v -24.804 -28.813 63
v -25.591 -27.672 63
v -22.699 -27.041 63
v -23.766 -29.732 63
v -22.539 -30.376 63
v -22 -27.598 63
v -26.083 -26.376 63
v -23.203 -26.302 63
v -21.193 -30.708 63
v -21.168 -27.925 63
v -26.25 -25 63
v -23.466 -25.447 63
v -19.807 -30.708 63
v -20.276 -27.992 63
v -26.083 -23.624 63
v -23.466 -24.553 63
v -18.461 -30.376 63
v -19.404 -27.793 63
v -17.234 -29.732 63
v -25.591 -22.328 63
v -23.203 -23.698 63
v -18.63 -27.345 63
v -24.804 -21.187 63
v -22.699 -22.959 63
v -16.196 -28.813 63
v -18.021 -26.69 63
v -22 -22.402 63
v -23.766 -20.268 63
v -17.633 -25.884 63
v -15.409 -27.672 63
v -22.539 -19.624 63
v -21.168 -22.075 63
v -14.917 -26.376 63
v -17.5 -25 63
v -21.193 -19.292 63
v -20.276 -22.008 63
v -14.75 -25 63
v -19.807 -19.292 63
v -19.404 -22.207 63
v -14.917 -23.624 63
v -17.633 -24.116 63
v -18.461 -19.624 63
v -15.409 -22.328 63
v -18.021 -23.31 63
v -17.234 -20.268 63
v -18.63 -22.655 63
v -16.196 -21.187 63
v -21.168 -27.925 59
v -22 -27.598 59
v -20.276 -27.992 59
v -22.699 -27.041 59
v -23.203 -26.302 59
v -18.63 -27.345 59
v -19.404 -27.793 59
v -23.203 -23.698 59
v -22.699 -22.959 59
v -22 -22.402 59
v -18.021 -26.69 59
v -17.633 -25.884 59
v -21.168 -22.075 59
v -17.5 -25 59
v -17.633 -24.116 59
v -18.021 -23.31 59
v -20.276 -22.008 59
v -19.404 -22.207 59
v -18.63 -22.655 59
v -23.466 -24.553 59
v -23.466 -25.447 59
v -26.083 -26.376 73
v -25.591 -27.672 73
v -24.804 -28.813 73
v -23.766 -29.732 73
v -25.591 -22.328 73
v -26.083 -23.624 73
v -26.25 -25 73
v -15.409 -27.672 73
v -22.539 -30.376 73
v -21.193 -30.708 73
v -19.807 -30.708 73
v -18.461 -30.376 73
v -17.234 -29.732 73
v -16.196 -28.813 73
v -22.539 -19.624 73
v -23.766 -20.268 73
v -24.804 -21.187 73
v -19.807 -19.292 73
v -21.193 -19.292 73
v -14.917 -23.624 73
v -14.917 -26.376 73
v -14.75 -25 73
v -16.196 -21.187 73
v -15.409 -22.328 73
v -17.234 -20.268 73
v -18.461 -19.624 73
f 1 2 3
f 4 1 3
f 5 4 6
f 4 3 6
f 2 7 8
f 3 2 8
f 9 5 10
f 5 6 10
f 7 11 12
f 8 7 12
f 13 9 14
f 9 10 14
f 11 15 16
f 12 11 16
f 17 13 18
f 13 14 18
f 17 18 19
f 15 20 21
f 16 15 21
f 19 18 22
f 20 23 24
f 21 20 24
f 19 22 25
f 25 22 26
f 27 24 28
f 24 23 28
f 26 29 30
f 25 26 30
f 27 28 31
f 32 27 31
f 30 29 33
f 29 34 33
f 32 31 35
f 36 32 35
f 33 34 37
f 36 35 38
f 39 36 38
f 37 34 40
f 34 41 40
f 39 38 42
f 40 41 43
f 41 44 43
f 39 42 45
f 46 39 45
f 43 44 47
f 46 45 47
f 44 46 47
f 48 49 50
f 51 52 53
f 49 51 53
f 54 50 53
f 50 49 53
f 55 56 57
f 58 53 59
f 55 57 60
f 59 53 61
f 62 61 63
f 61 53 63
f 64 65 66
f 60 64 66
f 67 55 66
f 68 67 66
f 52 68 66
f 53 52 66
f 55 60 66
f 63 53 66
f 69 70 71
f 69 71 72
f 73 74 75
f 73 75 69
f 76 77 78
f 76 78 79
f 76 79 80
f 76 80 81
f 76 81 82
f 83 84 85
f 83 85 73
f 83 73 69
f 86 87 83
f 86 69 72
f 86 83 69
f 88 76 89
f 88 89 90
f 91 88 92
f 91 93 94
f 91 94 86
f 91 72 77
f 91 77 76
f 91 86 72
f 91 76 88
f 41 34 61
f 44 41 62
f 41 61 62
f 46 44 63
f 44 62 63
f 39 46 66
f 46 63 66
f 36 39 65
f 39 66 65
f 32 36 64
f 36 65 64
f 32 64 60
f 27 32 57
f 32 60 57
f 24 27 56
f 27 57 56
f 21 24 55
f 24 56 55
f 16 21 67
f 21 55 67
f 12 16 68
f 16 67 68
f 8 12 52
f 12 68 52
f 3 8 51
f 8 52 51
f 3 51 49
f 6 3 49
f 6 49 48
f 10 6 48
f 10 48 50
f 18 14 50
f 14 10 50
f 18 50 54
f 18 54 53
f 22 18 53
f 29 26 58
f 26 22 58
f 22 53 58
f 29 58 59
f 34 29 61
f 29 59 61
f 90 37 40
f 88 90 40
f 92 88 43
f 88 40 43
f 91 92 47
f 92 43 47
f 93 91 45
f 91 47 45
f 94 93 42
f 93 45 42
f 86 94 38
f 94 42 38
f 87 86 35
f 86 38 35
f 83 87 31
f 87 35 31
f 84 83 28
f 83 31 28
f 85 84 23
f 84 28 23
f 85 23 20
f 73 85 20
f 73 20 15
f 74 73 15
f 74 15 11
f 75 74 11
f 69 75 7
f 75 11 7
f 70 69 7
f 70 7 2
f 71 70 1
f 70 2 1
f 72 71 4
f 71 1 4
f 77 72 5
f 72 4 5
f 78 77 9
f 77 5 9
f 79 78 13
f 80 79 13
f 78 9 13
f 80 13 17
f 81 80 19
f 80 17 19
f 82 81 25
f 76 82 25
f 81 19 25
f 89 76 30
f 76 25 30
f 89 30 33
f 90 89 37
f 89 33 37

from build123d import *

# Parameters (mm, degrees)
CYLINDER014_R     = 5.75
CYLINDER014_DEPTH = 10
CYLINDER013_R     = 3
CYLINDER013_DEPTH = 10


with BuildPart() as antennain001:
    # Cylinder014 → Cylinder014 (new body)
    with BuildSketch(Plane(origin=(-23, 0, 69), x_dir=(1, 0, 0), z_dir=(0, 0, 1))):
        Circle(CYLINDER014_R)
    extrude(amount=CYLINDER014_DEPTH)


with BuildPart() as fusion003:
    # Cylinder013 → Cylinder013 (new body)
    with BuildSketch(Plane(origin=(-23, 0, 65), x_dir=(1, 0, 0), z_dir=(0, 0, 1))):
        Circle(CYLINDER013_R)
    extrude(amount=CYLINDER013_DEPTH)

    # Fusion003: union antennaIn001
    add(antennain001.part)


with BuildPart() as fusion003_1:
    # Fusion003 placement: moved
    add(fusion003.part.moved(Location((2.5, -25, -6))))


solid = fusion003_1.part
